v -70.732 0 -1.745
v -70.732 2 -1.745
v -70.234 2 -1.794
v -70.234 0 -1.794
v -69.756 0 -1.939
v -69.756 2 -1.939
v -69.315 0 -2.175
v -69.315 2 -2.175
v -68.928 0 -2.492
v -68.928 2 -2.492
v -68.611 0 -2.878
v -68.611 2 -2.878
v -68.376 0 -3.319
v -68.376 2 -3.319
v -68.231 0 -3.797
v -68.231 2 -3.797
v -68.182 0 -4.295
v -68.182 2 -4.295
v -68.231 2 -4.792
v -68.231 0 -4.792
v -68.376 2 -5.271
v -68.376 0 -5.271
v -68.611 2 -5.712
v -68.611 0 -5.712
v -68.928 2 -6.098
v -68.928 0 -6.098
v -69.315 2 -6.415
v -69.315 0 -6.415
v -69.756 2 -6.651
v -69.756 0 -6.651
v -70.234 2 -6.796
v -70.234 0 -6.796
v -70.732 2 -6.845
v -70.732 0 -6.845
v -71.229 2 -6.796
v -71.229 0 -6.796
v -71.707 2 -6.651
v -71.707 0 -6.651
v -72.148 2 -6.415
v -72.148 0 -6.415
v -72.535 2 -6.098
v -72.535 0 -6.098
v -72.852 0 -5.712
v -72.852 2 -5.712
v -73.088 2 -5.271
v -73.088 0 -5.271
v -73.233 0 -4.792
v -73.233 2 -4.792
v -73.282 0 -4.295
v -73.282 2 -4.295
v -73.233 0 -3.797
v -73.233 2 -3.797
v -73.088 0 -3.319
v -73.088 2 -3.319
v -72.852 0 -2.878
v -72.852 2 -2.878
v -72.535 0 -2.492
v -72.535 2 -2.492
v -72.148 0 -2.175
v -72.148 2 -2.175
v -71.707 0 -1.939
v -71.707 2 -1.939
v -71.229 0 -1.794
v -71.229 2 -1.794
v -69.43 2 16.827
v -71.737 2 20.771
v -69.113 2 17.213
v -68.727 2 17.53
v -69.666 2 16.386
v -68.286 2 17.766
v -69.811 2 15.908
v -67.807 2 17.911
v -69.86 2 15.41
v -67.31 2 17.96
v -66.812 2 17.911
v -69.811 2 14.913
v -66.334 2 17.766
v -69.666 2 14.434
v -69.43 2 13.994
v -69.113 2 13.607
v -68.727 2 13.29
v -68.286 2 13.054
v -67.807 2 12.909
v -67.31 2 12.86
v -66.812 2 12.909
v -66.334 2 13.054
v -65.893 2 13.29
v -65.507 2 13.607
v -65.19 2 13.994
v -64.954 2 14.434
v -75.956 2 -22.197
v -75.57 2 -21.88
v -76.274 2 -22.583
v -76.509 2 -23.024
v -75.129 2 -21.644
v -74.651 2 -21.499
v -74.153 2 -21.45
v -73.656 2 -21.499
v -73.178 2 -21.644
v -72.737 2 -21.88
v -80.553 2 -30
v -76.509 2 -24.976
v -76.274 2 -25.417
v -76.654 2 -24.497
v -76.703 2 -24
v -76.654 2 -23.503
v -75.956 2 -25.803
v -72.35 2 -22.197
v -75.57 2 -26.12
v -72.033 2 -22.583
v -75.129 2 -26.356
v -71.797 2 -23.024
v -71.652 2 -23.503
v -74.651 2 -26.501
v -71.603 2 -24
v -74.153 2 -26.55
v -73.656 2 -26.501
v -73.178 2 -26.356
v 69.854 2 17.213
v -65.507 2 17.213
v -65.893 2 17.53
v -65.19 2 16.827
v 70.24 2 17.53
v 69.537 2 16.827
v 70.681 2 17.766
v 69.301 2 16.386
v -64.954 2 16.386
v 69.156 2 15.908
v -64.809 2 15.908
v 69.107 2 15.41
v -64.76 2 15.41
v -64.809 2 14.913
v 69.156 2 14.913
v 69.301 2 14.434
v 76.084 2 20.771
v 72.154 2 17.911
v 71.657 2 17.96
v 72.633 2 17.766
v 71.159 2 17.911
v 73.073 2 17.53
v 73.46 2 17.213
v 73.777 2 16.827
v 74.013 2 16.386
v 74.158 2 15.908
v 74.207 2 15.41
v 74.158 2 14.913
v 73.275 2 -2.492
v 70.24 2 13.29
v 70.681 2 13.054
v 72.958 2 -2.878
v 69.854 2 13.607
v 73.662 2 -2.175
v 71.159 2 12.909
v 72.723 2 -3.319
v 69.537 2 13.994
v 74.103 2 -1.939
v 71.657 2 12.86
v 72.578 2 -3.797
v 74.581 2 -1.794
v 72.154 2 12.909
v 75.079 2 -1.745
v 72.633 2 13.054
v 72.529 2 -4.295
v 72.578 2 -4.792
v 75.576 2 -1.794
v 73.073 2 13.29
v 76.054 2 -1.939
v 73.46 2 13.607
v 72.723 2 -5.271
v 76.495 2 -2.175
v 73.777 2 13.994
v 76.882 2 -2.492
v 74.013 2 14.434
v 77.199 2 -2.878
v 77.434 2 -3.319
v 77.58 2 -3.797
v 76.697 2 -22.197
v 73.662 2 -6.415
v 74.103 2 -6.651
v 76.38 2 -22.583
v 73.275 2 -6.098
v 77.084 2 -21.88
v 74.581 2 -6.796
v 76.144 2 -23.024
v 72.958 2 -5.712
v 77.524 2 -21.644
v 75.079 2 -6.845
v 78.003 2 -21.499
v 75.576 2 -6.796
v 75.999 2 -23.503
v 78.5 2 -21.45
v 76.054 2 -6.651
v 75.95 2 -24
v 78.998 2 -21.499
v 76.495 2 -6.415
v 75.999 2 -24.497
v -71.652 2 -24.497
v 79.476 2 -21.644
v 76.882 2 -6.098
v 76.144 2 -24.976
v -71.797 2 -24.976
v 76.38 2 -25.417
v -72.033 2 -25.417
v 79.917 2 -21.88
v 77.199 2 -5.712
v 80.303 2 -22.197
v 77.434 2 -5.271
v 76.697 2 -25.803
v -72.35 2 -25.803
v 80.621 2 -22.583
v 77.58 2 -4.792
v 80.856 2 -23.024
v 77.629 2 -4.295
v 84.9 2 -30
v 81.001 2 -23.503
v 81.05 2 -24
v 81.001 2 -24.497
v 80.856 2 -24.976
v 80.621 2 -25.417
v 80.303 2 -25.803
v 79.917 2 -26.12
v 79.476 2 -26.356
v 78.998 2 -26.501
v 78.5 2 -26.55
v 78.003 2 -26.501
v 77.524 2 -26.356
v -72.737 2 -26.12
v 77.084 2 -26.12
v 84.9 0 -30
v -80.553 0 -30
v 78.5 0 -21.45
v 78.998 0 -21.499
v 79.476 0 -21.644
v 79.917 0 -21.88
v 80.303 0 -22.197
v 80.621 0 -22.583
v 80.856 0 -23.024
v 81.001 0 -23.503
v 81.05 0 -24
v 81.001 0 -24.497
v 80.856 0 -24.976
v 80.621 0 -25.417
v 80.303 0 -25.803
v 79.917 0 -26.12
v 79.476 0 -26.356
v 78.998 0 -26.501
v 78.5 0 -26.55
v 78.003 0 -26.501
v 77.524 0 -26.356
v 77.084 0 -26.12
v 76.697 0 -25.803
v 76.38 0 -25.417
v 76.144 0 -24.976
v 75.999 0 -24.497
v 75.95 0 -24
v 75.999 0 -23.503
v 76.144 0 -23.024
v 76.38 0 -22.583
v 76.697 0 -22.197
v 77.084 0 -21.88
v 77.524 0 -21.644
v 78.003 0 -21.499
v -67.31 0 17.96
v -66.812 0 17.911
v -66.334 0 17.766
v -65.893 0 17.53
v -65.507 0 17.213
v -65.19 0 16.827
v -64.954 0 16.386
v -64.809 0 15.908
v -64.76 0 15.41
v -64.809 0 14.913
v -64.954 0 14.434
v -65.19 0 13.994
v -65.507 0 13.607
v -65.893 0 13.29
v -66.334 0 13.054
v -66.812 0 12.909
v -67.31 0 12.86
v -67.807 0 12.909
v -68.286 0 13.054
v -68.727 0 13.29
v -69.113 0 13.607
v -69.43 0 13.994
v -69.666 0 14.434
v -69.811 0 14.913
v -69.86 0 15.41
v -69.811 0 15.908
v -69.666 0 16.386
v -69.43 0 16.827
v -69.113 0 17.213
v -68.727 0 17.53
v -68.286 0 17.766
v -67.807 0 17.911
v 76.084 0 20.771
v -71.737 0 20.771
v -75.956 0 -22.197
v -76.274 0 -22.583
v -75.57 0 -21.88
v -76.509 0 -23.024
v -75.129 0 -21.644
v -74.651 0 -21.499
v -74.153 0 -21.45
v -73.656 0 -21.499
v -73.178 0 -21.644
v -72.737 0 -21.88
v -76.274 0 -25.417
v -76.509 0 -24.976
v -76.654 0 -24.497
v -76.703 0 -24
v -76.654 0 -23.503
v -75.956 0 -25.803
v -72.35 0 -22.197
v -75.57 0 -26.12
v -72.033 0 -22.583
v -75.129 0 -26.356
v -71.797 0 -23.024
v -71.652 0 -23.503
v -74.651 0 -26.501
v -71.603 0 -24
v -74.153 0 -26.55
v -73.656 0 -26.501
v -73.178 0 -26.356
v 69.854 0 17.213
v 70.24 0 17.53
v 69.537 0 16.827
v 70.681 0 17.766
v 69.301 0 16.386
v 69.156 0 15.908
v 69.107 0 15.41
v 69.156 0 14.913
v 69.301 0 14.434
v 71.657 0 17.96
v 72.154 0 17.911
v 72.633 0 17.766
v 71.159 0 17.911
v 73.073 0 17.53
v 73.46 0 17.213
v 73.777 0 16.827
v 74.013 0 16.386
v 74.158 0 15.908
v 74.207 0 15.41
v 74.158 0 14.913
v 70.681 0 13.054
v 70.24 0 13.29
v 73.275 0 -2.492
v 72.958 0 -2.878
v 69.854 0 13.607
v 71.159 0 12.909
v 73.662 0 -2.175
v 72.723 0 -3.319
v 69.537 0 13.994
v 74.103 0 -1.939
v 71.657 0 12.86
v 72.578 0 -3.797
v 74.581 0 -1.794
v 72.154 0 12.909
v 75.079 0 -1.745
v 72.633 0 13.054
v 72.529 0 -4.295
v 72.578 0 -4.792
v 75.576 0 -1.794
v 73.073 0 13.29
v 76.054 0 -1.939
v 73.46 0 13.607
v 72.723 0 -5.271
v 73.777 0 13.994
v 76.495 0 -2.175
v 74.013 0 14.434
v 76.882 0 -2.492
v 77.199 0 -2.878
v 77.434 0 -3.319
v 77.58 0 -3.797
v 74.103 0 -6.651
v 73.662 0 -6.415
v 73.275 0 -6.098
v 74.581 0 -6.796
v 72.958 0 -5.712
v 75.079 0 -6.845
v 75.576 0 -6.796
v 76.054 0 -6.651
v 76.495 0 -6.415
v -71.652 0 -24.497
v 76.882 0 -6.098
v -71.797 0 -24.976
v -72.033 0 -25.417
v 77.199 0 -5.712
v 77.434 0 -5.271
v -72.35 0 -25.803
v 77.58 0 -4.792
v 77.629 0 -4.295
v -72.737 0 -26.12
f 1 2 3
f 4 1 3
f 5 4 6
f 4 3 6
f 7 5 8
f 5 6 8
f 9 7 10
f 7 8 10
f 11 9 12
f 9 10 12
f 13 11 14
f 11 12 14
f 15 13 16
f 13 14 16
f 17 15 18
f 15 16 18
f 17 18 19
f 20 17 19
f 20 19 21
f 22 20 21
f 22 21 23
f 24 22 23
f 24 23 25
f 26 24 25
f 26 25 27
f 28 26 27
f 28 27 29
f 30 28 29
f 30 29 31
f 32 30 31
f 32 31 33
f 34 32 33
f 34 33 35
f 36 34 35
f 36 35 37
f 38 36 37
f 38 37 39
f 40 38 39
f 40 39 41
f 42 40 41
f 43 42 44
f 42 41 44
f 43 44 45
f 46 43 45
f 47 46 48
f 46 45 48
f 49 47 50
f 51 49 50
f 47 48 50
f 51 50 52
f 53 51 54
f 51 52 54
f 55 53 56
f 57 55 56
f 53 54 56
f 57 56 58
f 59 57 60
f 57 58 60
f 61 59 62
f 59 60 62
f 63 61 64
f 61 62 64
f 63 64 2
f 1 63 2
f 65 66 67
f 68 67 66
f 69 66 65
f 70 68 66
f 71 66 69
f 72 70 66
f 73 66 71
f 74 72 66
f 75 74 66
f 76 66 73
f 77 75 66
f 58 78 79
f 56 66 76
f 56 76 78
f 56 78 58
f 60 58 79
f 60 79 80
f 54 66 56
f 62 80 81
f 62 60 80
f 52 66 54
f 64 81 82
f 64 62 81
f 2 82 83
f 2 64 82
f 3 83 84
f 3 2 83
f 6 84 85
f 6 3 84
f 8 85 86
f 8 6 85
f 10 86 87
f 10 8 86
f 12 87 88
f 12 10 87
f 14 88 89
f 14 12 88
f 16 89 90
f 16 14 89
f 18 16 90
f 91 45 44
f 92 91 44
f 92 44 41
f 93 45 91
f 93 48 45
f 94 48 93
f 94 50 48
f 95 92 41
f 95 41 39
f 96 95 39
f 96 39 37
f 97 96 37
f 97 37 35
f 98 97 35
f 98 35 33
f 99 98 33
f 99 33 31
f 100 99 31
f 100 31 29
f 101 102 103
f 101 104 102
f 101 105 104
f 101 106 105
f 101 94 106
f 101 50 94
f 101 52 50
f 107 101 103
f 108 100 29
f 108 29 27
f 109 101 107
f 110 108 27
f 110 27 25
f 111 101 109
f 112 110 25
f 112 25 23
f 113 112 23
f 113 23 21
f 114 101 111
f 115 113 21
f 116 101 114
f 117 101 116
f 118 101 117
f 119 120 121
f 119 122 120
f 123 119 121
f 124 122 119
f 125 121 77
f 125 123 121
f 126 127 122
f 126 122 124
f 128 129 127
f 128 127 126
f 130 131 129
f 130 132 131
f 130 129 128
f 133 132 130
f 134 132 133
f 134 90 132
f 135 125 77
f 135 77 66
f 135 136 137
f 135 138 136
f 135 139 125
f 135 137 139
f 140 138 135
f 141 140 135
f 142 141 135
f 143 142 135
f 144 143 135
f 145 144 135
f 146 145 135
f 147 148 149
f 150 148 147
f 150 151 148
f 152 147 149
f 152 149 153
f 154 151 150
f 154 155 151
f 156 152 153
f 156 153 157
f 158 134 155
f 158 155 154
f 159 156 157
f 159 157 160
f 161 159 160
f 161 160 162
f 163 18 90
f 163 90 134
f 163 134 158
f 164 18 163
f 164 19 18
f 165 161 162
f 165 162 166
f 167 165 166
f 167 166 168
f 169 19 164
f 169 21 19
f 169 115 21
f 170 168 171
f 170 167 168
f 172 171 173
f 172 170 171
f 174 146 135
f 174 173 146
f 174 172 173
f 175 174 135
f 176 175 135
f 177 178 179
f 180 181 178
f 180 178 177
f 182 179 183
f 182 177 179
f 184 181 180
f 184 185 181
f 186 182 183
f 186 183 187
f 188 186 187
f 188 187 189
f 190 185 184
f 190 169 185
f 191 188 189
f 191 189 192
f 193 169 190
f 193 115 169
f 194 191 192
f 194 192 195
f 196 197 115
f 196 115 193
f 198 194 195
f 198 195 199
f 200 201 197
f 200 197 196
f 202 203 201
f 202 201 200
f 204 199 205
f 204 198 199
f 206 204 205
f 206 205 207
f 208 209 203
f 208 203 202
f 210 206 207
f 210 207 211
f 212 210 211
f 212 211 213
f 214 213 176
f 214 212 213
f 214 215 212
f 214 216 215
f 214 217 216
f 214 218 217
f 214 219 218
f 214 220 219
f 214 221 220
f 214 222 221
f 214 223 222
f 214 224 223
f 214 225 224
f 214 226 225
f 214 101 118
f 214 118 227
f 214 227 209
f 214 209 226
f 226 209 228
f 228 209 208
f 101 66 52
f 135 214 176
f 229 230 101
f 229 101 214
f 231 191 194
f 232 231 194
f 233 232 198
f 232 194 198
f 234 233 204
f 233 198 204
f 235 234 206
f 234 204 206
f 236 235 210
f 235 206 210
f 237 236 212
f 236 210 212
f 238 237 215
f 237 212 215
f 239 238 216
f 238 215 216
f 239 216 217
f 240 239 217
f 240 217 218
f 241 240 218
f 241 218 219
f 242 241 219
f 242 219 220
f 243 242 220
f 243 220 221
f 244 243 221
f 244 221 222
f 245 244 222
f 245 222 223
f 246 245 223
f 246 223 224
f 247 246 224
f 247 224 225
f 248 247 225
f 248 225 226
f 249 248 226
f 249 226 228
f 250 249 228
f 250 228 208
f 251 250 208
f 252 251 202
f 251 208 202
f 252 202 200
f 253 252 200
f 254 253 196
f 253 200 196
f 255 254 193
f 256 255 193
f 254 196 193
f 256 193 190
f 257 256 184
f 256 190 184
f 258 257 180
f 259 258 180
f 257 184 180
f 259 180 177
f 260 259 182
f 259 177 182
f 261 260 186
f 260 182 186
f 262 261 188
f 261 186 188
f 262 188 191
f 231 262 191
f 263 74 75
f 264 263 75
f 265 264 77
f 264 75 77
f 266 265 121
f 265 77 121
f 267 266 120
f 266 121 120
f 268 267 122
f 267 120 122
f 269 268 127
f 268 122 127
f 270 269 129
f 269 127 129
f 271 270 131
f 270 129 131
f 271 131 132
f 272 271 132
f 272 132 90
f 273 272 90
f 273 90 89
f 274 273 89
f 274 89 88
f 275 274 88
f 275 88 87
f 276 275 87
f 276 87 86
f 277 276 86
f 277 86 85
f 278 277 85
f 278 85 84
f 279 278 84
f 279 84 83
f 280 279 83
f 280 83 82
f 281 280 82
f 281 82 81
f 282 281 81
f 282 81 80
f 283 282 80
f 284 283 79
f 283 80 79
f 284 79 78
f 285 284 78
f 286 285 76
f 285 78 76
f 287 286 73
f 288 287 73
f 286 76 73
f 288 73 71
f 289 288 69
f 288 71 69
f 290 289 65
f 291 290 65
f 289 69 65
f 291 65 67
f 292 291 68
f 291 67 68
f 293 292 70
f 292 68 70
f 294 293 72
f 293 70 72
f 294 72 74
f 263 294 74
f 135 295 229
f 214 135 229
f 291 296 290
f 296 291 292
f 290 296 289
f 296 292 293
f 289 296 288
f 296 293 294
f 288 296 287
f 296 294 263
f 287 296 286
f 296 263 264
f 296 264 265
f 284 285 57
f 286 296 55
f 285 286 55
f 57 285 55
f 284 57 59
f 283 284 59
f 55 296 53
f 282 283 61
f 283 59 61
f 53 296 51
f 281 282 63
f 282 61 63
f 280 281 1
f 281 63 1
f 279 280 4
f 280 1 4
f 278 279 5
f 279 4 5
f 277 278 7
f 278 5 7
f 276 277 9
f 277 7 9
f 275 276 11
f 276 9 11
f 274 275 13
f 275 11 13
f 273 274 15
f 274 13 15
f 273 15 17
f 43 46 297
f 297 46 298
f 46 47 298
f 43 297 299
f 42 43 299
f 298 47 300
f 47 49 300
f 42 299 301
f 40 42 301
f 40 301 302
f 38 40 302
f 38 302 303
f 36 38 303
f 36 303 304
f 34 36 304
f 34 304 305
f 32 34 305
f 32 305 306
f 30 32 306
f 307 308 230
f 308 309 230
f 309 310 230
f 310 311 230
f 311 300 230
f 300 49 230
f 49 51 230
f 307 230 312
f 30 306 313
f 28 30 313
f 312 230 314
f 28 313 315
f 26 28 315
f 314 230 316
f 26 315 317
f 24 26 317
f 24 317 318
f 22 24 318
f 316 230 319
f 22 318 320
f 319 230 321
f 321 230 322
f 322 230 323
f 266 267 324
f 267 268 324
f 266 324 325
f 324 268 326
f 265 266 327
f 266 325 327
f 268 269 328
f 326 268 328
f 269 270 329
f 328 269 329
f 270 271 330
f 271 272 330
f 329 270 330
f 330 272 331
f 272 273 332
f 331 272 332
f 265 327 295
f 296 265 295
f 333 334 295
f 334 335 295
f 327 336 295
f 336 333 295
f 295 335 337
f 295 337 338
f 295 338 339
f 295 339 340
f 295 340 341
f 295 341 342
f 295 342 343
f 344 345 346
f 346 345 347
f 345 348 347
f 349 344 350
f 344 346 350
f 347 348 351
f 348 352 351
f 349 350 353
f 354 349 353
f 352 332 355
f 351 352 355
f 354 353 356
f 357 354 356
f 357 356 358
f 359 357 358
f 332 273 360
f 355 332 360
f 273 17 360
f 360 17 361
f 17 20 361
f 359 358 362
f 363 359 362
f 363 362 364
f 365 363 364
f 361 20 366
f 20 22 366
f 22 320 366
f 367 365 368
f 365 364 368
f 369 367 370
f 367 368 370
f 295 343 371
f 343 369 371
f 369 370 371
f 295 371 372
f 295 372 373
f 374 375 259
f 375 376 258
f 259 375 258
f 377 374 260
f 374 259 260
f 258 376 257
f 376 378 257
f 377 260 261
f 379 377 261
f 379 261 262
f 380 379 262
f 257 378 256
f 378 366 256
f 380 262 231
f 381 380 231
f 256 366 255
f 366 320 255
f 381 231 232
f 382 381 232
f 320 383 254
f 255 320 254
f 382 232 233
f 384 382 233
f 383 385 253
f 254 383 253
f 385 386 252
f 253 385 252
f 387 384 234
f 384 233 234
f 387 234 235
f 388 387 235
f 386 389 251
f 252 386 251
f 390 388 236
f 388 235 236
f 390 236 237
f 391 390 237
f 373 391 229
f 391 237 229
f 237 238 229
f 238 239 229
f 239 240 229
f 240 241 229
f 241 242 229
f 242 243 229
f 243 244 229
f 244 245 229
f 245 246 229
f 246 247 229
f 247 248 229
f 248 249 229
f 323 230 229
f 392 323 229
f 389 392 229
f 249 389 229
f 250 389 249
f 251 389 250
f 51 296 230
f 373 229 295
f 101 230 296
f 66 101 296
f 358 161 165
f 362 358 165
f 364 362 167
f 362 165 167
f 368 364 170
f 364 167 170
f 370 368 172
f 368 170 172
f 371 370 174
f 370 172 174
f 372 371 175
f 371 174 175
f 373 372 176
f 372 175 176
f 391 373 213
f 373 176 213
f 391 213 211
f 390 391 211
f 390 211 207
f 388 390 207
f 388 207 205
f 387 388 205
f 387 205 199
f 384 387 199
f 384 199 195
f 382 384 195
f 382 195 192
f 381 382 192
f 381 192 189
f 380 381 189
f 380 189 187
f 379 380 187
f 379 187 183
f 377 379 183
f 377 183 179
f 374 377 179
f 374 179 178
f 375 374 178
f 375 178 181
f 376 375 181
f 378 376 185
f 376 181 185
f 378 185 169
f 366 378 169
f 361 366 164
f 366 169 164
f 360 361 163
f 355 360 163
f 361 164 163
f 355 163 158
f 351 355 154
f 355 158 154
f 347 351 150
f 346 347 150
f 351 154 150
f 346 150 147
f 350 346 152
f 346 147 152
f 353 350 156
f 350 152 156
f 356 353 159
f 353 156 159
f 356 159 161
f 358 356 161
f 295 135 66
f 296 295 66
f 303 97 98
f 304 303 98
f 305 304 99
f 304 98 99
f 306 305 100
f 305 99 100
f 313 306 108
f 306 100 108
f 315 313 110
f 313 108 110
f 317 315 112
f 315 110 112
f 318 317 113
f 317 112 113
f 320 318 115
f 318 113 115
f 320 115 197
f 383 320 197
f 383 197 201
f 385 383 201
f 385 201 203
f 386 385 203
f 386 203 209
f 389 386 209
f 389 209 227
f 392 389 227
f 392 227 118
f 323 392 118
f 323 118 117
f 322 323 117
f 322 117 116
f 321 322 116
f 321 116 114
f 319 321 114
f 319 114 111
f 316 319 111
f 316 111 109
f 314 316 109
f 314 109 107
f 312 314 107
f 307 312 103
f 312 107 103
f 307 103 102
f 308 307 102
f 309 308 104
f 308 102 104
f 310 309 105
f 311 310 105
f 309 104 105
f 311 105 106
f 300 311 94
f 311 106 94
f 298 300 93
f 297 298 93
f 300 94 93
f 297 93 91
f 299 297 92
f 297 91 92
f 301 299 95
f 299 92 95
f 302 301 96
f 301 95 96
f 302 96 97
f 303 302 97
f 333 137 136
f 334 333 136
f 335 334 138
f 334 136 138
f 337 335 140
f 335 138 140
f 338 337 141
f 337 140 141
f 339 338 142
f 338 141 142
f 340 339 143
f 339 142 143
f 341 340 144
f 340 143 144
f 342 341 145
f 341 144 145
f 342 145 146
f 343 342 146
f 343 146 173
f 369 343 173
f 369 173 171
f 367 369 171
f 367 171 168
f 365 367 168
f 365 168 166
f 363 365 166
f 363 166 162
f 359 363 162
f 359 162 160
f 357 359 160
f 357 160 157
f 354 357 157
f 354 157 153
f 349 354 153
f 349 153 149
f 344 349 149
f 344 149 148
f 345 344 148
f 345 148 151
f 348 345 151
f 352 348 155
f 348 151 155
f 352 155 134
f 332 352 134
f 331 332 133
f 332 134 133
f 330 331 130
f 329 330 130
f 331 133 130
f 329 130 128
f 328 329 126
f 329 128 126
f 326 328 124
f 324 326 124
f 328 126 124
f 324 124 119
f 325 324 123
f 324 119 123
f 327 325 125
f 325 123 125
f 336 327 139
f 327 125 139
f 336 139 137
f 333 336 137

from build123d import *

# Parameters (mm, degrees)
SKETCH_1_W          = 200
SKETCH_1_H          = 60
EXTRUDE_1_DEPTH     = 2
SKETCH_3_R          = 2.55
CUT_EXTRUDE_1_DEPTH = 105.422219858
CUT_EXTRUDE_2_DEPTH = 96.828733232


with BuildPart() as part:
    # 草图1 → 凸台-拉伸1 (new body)
    with BuildSketch(Plane(origin=(0, 0, 0), x_dir=(1, 0, 0), z_dir=(0, 1, 0))):
        Rectangle(SKETCH_1_W, SKETCH_1_H)
    extrude(amount=EXTRUDE_1_DEPTH)

    # 草图3 → 切除-拉伸1 (cut, through all)
    with BuildSketch(Plane(origin=(0, 2, 0), x_dir=(1, 0, 0), z_dir=(0, 1, 0))):
        Polygon((82.173464202, -20.771330594), (-77.826535798, -20.771330594), (-86.642884834, 30), (-100, 30), (-100, -30), (100, -30), (100, 30), (90.989813237, 30), align=None)
        with Locations(Location((-74.153372817, 24, 0), (0, 0, 270))):
            Circle(SKETCH_3_R)
        with Locations(Location((-70.731615422, 4.294884514, 0), (0, 0, 270))):
            Circle(SKETCH_3_R)
        with Locations(Location((-67.309858027, -15.410230973, 0), (0, 0, 270))):
            Circle(SKETCH_3_R)
        with Locations(Location((78.50030122, 24, 0), (0, 0, 270))):
            Circle(SKETCH_3_R)
        with Locations(Location((71.65678643, -15.410230973, 0), (0, 0, 270))):
            Circle(SKETCH_3_R)
        with Locations(Location((75.078543825, 4.294884514, 0), (0, 0, 270))):
            Circle(SKETCH_3_R)
    extrude(amount=-CUT_EXTRUDE_1_DEPTH, mode=Mode.SUBTRACT)

    # 草图4 → 切除-拉伸2 (cut, through all)
    with BuildSketch(Plane.XZ):
        Polygon((76.083674975, 20.771330594), (84.90002401, -30), (90.989813237, -30), (82.173464202, 20.771330594), align=None)
        Polygon((-86.642884834, -30), (-80.553095607, -30), (-71.736746572, 20.771330594), (-77.826535798, 20.771330594), align=None)
    extrude(amount=-CUT_EXTRUDE_2_DEPTH, mode=Mode.SUBTRACT)


solid = part.part
